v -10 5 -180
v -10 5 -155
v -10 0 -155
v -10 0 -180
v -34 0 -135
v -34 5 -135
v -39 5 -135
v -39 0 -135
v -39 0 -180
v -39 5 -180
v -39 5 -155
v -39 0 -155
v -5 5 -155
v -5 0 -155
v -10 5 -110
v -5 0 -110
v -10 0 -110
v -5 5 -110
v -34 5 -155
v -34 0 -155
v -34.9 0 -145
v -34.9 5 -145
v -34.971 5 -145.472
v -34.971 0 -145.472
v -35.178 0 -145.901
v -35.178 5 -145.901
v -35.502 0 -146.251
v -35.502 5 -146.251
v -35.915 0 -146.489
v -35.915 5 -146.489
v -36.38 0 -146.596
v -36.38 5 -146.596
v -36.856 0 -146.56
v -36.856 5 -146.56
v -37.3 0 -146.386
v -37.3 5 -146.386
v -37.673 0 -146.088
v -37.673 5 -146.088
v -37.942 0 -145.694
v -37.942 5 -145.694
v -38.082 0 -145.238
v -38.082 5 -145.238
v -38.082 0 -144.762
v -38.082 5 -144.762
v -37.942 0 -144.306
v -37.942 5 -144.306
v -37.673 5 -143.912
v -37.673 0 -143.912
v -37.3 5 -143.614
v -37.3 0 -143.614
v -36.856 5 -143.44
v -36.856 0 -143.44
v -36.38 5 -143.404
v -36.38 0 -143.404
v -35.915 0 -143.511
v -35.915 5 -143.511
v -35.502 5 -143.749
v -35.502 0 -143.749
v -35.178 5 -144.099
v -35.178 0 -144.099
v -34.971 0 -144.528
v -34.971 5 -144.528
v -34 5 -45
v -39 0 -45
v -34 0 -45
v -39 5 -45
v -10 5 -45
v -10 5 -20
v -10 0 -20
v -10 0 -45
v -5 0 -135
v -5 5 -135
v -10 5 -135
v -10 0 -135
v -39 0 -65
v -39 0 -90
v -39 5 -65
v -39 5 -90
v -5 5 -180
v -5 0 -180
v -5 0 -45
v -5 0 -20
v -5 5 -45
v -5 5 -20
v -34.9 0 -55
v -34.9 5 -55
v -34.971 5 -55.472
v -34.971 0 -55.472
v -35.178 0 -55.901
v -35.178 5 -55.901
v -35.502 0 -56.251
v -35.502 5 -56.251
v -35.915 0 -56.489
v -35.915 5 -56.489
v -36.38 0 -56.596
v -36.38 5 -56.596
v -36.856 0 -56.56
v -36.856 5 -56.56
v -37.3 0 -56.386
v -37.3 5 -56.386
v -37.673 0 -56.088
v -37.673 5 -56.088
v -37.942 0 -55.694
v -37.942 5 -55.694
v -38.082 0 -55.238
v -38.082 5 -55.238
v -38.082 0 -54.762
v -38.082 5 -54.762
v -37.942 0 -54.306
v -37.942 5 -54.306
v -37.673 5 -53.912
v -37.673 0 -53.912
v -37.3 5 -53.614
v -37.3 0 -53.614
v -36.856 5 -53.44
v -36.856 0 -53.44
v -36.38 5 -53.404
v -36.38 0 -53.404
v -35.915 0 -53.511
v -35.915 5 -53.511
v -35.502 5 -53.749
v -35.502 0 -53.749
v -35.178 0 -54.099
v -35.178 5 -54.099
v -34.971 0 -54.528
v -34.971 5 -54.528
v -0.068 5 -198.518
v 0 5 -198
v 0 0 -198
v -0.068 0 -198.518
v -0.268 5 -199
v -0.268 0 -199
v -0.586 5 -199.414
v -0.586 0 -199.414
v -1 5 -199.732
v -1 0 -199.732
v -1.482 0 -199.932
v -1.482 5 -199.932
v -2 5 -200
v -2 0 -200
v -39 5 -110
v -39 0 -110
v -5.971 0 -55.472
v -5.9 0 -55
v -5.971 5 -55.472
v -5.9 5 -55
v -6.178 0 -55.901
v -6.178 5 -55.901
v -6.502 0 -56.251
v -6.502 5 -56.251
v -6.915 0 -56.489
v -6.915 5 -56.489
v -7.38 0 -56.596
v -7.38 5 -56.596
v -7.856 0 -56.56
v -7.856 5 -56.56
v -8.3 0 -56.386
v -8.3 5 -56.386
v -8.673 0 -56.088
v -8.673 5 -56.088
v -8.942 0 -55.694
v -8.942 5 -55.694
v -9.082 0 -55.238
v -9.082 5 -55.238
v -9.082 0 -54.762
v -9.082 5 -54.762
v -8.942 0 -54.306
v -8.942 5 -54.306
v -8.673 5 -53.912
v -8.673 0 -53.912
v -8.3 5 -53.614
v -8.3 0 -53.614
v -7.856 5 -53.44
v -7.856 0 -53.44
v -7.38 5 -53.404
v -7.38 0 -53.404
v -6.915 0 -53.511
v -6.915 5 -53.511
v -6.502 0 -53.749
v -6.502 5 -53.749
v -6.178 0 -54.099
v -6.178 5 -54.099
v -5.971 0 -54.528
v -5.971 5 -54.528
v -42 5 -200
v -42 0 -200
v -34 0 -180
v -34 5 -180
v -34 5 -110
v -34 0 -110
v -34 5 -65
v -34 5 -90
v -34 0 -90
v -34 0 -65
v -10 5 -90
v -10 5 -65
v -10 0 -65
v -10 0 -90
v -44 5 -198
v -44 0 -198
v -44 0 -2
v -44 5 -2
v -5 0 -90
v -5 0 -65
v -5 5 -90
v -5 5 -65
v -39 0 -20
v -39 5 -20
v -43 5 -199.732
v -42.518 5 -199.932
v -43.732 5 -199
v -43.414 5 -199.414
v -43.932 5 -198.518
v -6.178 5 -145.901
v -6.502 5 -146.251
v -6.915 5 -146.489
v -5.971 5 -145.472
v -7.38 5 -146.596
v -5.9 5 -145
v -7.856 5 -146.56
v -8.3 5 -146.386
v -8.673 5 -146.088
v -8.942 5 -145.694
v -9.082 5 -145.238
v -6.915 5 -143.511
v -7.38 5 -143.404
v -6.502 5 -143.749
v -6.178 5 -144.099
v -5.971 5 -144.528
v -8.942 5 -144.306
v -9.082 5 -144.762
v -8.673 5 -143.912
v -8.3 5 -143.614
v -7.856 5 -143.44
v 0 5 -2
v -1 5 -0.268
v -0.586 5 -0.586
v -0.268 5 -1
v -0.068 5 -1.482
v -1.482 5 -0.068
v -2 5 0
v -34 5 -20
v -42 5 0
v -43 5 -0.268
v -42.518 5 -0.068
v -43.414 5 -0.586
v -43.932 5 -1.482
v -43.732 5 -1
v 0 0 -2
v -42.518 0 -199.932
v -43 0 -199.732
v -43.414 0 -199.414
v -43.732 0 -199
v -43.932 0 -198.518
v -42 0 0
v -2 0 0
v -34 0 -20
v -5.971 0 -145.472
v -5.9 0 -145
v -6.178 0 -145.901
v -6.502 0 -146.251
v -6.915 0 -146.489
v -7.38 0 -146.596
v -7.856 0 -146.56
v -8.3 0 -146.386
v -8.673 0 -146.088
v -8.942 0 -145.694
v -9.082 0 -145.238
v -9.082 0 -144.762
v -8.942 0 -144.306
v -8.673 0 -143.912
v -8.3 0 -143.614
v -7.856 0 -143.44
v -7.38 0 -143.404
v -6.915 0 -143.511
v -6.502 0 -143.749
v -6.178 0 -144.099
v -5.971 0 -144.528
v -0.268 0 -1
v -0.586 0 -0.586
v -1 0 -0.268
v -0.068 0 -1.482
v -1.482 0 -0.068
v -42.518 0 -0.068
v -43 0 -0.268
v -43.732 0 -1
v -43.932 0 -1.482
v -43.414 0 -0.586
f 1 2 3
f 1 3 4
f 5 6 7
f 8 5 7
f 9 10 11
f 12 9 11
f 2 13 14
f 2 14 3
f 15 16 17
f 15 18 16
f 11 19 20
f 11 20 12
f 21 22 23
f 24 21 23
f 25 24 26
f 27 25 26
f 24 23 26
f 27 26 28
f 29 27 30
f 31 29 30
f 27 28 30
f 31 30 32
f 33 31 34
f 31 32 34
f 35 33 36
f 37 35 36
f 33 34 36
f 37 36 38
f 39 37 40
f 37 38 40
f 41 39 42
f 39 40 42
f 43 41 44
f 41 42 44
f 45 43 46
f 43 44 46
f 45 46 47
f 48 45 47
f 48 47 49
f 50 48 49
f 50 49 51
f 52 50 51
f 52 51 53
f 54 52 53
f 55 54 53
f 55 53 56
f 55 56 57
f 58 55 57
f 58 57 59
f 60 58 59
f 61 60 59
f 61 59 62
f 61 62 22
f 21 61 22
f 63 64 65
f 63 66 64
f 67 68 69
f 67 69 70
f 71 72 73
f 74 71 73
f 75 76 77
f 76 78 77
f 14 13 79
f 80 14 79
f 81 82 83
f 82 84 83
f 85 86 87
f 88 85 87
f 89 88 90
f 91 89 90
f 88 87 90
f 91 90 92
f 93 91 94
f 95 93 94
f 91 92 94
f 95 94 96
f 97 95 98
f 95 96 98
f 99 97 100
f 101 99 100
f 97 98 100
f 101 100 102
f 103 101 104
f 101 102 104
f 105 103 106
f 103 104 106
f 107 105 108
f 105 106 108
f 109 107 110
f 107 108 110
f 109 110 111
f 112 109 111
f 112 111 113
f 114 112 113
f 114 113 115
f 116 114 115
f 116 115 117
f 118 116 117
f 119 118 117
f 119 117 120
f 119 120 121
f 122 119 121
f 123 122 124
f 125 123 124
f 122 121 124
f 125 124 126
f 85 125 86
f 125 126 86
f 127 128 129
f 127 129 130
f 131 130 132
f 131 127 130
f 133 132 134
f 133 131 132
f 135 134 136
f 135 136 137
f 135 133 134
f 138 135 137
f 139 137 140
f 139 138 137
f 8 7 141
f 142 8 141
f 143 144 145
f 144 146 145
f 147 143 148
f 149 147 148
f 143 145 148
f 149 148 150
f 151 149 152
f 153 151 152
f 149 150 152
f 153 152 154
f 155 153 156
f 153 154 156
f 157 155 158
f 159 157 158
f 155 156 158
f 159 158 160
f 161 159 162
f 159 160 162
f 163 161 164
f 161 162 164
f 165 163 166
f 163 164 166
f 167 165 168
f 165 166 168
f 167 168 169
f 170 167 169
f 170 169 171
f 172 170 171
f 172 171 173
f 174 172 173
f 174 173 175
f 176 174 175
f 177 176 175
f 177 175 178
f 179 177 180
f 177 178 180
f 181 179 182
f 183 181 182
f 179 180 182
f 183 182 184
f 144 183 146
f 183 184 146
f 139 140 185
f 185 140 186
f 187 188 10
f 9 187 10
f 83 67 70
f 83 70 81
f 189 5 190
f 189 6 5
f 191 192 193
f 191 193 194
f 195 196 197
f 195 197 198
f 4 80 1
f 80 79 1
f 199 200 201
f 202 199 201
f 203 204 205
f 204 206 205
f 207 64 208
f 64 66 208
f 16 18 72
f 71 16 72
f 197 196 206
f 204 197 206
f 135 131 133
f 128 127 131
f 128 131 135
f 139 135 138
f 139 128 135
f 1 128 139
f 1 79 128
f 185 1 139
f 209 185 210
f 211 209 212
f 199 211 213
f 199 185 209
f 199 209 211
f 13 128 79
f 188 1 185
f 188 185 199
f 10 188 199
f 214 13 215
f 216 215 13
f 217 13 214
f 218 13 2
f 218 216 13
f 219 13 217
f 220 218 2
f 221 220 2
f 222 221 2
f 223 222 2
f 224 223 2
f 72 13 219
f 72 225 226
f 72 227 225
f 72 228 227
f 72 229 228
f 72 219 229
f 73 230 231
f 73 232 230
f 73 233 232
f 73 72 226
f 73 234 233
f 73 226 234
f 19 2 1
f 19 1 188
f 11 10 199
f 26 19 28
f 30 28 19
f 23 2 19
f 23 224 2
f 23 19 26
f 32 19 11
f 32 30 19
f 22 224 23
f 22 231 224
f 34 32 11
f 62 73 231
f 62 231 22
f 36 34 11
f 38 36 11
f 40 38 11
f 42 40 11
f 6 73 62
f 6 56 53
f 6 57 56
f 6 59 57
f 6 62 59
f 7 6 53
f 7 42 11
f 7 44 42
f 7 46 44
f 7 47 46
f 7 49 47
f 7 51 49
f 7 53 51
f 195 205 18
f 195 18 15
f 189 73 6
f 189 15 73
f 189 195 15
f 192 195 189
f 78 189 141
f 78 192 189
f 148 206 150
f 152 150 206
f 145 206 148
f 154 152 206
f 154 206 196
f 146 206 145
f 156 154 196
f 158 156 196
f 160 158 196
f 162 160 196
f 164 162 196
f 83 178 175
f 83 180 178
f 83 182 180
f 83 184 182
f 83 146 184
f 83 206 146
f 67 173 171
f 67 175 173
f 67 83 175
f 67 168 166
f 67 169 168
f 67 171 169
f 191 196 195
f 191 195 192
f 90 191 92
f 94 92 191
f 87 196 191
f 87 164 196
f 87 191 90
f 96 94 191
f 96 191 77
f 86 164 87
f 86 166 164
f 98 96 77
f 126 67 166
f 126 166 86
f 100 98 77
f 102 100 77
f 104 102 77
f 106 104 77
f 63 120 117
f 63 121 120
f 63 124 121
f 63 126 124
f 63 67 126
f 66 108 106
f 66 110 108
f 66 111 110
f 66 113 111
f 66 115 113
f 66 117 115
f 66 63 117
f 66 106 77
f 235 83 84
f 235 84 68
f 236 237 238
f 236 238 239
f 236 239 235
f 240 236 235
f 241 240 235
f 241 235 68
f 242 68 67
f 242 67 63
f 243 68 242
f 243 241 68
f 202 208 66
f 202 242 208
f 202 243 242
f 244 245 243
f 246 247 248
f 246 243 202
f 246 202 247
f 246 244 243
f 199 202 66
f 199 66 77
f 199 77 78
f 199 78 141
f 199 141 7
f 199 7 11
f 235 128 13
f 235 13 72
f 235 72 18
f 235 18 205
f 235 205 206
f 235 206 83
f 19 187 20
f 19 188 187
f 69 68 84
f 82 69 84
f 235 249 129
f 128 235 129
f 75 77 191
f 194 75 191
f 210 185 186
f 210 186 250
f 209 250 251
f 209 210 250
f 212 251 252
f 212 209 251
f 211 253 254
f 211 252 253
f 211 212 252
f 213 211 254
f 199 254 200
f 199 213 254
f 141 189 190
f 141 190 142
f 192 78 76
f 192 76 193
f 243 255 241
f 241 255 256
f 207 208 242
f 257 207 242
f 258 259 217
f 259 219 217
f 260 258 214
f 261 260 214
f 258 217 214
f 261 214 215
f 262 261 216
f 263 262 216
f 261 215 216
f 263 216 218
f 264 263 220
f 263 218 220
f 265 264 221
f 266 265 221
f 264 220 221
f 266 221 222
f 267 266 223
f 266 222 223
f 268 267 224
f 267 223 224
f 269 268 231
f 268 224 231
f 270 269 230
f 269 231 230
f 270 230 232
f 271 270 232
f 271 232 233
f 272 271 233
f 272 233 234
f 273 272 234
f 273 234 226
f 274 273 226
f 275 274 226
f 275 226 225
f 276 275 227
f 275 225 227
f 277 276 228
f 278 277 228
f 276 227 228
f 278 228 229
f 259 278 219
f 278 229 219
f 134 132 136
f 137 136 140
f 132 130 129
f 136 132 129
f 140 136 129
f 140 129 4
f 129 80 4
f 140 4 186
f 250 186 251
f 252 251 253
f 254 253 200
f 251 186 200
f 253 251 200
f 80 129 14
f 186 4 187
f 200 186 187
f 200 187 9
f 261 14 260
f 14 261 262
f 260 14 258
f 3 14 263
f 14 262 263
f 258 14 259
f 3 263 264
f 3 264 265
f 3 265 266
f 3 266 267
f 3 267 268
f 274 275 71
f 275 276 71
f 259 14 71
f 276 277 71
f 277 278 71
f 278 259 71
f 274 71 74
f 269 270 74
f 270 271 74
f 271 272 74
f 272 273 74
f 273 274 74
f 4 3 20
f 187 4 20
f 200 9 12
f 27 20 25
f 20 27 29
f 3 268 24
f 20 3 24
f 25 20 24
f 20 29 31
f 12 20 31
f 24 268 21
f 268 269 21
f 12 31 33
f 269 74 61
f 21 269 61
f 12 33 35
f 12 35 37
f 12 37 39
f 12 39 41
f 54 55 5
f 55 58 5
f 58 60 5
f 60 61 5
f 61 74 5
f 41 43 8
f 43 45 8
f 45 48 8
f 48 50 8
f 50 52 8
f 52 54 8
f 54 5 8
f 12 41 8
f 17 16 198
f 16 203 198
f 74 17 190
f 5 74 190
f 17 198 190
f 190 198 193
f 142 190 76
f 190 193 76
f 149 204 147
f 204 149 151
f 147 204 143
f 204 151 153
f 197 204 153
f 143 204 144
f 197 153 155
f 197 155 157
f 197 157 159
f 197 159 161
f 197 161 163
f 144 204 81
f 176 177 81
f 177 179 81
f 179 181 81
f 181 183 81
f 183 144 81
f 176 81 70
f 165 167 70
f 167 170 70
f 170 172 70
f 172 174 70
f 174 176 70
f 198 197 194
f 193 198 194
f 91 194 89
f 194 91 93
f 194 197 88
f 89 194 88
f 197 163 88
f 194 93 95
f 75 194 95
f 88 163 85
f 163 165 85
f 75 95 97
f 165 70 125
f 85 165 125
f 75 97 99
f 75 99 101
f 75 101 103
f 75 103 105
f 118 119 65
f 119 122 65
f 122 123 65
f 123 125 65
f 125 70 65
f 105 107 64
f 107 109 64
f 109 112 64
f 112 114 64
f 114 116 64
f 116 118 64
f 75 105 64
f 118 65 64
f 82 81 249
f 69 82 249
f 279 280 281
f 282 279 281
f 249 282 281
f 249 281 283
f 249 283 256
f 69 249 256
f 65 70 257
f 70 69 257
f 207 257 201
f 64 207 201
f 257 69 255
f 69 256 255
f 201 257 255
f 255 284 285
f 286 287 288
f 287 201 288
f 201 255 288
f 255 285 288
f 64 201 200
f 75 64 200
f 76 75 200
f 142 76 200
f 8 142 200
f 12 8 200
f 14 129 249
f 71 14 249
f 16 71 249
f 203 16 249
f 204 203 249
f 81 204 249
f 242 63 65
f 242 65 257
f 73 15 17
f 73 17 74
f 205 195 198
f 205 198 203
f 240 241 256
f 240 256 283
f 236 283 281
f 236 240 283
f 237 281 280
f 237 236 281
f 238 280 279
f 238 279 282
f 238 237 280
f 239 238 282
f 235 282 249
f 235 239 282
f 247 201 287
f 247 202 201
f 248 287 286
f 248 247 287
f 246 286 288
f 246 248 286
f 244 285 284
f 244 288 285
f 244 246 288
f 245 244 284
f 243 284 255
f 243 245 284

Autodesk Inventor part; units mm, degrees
ref_plane "YZ Plane" through (0, 0, 0) normal (1, 0, 0) x (0, 1, 0)
sketch "Sketch1" plane through (0, 0, 0) normal (0, 1, 0) x (-1, 0, 0)
  line L0 (0, 0) -> (0, -200)
  line L1 (0, -200) -> (44, -200)
  line L2 (44, -200) -> (44, 0)
  line L3 (44, 0) -> (0, 0)
  dimension "d0" = 200
  dimension "d1" = 44
extrude "Extrusion1" add sketch "Sketch1" along normal blind 5
sketch "Sketch2" plane through (0, 5, 0) normal (0, 1, 0) x (1, 0, 0)
  line L0 (-10, 8) -> (-10, 208)
  line L1 (-10, 208) -> (-30, 208)
  line L2 (-30, 208) -> (-30, 8)
  line L3 (-30, 8) -> (-10, 8)
  line L4 (-10, 8) -> (-30, 208) construction
  line L5 (-10, 208) -> (-30, 8) construction
  line L6 (0, 200) -> (-44, 200) projected
  line L7 (-44, 0) -> (0, 0) projected
  line L8 (0, 0) -> (0, 200) projected
  line L9 (-35, 0) -> (-35, 200)
  line L10 (-5, 0) -> (-5, 200)
  line L11 (-35, 10) -> (-30, 10)
  line L12 (-10, 20) -> (-5, 20)
  line L13 (-35, 35) -> (-30, 35)
  line L14 (-10, 45) -> (-5, 45)
  line L15 (-35, 55) -> (-30, 55)
  line L16 (-10, 65) -> (-5, 65)
  line L17 (-35, 80) -> (-30, 80)
  line L18 (-10, 90) -> (-5, 90)
  point P0 (-20, 108)
  dimension "d4" = 200
  dimension "d5" = 20
  dimension "d6" = 108
  dimension "d8" = 5
  dimension "d9" = 5
  dimension "d14" = 10
  dimension "d15" = 25
  dimension "d16" = 20
  dimension "d17" = 25
  dimension "d18" = 20
  dimension "d19" = 25
  dimension "d20" = 20
  dimension "d21" = 25
  dimension "d41" = 5
extrude "Extrusion2" cut sketch "Sketch2" against normal blind 5 contours L0 L14 L10 L12 | L0 L18 L10 L16
ref_plane "Work Plane1" through (-22, 0, 0) normal (1, 0, 0) x (0, 0, -1)
ref_plane "Work Plane2" through (0, 0, -100) normal (0, 0, -1) x (-1, 0, 0)
mirror "Mirror1" about plane through (-22, 0, 0) normal (1, 0, 0) of "Extrusion2"
mirror "Mirror2" about plane through (0, 0, -100) normal (0, 0, -1) of "Extrusion2", "Mirror1"
sketch "Sketch5" plane through (0, 5, 0) normal (0, 1, 0) x (1, 0, 0)
  circle A0 centre (-7.5, 55) radius 1.6
  line L0 (-10, 45) -> (-5, 45) projected
  line L1 (-5, 45) -> (-5, 20) projected
  line L2 (0, 0) -> (0, 200) projected
  line L3 (0, 100) -> (-44, 100)
  line L4 (-44, 200) -> (-44, 0) projected
  line L5 (0, 200) -> (-44, 200) projected
  line L6 (-22, 200) -> (-22, 0)
  line L7 (-44, 0) -> (0, 0) projected
  circle A1 centre (-7.5, 145) radius 1.6
  circle A2 centre (-36.5, 55) radius 1.6
  circle A3 centre (-36.5, 145) radius 1.6
  dimension "d42" = 3.2
  dimension "d43" = 10
  dimension "d44" = 2.5
extrude "Extrusion4" cut sketch "Sketch5" against normal blind 5 contours A0 | A1 | A2 | A3
fillet "Fillet1" radius 2 4 edges at (-44, 2.5, 0) (0, 2.5, 0) (0, 2.5, -200) (-44, 2.5, -200)
properties part number "BatPlate" material "ABS Plastic"
